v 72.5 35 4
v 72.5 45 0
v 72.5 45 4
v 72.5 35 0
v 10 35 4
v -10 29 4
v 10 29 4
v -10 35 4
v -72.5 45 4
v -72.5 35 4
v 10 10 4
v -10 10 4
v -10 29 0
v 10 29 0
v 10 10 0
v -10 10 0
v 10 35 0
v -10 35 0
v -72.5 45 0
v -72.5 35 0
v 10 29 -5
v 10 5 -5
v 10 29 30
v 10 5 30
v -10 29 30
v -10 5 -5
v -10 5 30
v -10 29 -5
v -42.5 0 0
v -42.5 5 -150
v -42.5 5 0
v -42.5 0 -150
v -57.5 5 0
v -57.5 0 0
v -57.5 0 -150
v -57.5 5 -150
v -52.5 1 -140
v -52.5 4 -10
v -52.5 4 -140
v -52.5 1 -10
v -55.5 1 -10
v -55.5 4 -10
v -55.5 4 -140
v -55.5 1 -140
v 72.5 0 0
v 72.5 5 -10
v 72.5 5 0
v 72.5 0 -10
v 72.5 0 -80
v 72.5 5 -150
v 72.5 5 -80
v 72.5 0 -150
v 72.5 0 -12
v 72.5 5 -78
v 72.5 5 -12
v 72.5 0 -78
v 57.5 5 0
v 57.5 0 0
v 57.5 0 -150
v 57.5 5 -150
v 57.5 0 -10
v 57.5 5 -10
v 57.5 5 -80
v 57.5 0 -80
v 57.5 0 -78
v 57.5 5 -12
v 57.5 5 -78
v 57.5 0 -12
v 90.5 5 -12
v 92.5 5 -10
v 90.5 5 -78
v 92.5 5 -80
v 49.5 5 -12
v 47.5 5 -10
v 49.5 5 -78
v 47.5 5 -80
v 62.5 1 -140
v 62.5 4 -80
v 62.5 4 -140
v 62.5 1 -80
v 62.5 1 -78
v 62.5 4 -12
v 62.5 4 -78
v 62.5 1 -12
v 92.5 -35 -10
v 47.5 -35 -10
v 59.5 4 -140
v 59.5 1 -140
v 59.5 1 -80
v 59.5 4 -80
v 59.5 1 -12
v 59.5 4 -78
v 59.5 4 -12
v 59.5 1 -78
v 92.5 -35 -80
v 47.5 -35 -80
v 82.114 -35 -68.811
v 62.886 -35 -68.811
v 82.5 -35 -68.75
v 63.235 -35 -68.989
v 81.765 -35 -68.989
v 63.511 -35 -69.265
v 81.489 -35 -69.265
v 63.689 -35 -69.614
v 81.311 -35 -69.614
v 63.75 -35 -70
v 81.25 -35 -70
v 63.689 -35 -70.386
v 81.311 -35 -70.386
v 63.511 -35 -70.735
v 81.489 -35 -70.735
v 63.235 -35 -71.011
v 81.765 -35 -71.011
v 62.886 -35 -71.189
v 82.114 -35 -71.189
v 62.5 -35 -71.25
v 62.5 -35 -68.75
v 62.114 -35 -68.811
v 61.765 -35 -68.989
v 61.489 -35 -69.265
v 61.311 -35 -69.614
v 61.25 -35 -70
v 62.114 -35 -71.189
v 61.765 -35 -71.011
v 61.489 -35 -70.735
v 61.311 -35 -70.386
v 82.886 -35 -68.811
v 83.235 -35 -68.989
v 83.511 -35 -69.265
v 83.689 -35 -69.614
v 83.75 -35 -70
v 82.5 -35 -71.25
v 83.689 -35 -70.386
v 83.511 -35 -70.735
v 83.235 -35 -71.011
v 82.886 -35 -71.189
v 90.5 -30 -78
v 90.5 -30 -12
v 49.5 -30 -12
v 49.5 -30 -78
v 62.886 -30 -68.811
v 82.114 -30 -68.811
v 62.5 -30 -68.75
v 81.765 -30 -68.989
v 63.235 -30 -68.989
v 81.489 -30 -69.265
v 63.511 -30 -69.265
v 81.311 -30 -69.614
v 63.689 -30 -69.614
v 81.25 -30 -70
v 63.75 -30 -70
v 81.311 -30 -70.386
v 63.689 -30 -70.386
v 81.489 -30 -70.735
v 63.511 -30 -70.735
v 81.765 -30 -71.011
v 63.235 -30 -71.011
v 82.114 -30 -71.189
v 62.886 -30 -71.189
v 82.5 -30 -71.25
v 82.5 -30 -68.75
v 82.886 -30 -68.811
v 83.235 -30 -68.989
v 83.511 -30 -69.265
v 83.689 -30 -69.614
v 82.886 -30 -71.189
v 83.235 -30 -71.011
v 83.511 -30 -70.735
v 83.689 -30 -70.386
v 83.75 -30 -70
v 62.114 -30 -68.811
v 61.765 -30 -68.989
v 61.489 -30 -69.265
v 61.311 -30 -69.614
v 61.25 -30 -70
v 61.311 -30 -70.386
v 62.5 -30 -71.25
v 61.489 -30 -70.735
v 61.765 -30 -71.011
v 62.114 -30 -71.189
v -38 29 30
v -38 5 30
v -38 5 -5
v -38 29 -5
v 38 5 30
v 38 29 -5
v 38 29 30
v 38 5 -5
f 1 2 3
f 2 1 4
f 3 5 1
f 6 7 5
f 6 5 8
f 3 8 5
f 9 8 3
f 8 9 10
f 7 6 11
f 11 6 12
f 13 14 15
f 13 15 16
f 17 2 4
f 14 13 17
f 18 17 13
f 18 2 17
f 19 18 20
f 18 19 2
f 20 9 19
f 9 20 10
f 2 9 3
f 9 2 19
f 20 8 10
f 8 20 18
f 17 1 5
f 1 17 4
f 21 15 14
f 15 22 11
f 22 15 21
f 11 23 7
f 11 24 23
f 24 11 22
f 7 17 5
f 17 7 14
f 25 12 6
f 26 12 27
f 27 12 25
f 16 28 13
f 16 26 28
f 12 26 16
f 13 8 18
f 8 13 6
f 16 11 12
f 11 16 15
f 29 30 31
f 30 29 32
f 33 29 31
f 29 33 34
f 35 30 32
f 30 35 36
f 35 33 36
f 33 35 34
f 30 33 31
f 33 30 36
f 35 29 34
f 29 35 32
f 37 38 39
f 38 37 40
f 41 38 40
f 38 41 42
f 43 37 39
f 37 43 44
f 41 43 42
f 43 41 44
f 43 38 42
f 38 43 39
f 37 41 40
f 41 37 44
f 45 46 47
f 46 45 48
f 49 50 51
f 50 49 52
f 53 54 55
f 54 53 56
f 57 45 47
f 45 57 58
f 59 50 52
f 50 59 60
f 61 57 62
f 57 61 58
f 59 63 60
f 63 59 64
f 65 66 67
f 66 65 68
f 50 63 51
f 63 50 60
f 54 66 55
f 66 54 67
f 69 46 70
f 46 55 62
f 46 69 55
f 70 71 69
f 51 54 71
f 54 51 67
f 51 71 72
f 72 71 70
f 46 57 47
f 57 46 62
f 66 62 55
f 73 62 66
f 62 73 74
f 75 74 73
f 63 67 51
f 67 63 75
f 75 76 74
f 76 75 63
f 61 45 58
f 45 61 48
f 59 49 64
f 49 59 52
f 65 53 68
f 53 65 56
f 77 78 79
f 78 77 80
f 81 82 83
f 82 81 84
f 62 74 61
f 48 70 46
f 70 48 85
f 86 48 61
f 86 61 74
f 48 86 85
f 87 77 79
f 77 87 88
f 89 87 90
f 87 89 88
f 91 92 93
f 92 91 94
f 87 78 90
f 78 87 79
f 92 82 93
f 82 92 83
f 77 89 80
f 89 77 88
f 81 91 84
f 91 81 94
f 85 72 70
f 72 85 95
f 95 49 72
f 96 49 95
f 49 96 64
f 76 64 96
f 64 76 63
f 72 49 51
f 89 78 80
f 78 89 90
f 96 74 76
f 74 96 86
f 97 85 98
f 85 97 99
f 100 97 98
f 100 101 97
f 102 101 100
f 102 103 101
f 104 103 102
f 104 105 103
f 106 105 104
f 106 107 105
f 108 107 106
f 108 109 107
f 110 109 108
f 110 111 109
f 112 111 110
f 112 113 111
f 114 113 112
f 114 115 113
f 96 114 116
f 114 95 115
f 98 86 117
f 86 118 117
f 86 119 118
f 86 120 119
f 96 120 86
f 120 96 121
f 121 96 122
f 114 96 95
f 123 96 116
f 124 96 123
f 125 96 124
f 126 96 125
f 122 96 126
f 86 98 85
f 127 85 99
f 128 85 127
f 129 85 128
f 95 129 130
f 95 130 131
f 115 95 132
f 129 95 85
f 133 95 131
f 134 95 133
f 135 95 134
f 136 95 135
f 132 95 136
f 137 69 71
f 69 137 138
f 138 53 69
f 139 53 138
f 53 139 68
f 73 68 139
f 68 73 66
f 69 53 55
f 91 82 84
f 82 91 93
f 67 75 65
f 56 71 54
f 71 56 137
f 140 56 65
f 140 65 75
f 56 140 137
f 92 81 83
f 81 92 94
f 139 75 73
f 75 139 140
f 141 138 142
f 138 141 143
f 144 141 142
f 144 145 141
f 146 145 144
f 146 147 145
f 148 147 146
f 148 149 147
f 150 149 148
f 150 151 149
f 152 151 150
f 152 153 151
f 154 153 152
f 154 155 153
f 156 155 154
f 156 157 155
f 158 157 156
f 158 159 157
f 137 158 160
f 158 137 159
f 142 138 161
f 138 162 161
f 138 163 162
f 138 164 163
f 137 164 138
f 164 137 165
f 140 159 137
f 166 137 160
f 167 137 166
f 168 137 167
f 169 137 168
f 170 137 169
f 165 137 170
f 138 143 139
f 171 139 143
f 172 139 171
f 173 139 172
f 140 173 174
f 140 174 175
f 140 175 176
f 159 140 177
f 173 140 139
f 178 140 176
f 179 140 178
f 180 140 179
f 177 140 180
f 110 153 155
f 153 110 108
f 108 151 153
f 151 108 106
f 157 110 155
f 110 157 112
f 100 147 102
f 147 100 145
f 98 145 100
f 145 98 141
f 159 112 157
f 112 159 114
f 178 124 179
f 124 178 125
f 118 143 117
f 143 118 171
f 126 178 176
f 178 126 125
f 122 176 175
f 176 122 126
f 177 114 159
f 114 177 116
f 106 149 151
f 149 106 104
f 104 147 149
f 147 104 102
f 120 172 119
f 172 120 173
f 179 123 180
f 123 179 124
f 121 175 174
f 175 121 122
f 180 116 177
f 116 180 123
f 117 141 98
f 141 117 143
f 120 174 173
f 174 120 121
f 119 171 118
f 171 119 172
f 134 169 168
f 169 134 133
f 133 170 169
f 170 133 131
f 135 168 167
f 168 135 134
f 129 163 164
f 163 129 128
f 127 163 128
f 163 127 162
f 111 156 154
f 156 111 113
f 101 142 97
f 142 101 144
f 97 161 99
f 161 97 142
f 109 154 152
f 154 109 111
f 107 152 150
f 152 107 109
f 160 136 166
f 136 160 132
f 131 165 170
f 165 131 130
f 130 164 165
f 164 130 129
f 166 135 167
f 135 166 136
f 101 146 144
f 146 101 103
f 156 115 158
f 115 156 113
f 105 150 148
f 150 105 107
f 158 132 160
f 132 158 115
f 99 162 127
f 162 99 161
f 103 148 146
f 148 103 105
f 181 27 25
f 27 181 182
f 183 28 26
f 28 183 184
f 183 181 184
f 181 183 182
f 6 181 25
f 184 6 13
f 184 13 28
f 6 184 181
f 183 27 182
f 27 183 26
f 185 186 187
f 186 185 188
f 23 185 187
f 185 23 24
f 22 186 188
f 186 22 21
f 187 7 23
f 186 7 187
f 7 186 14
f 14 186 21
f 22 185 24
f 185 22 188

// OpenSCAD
/**
 * Clarigggz Franken-Glass v0.1 Prototype Frame
 * Tool: OpenSCAD (Code-as-CAD)
 * License: CERN-OHL-P
 */

// --- Parameters ---
frame_width = 145;
frame_height = 45;
frame_thickness = 4;
bridge_gap = 20;

temple_length = 150;
temple_width = 15;
temple_thickness = 5;

// Optics module dimensions (Birdbath 0.49")
optics_w = 28;
optics_h = 24;
optics_d = 35;

// --- Modules ---

module main_bridge() {
    difference() {
        // Main front frame
        union() {
            // Brow bar
            translate([-frame_width/2, frame_height - 10, 0])
                cube([frame_width, 10, frame_thickness]);
            
            // Bridge
            translate([-bridge_gap/2, 10, 0])
                cube([bridge_gap, frame_height - 10, frame_thickness]);
        }
        
        // Lens/Optics cutouts
        translate([-(bridge_gap/2 + optics_w), 5, -1])
            cube([optics_w, optics_h, frame_thickness + 2]);
        translate([bridge_gap/2, 5, -1])
            cube([optics_w, optics_h, frame_thickness + 2]);
    }
}

module temple_arm(side=1) {
    // side: 1 for right, -1 for left
    translate([side * (frame_width/2 - temple_width), 0, -temple_length])
        union() {
            // Main arm
            difference() {
                cube([temple_width, temple_thickness, temple_length]);
                
                // Cable routing channel (Internal)
                translate([2, 1, 10])
                    cube([3, 3, temple_length - 20]);
            }
            
            // Mounting box for BPI-F3 (Right side only for now)
            if (side == 1) {
                translate([-10, -35, temple_length - 80])
                    difference() {
                        cube([45, 40, 70]); // BPI-F3 SoM Carrier box
                        
                        translate([2, 5, 2])
                            cube([41, 36, 66]); // Inner cavity
                            
                        // Mounting holes for electronics
                        translate([15, 0, 10]) rotate([-90, 0, 0]) cylinder(d=2.5, h=20, $fn=20);
                        translate([35, 0, 10]) rotate([-90, 0, 0]) cylinder(d=2.5, h=20, $fn=20);
                    }
            }
        }
}

module birdbath_module() {
    color("cyan", 0.5)
    cube([optics_w, optics_h, optics_d]);
}

// --- Assembly ---

// Front Frame
main_bridge();

// Left Temple
temple_arm(-1);

// Right Temple (with BPI-F3 mount)
temple_arm(1);

// Mock Optics placement
translate([-(bridge_gap/2 + optics_w), 5, -5])
    birdbath_module();

translate([bridge_gap/2, 5, -5])
    birdbath_module();

echo("Clarigggz Hardware: Franken-Glass v0.1 Assembly Rendered.");
